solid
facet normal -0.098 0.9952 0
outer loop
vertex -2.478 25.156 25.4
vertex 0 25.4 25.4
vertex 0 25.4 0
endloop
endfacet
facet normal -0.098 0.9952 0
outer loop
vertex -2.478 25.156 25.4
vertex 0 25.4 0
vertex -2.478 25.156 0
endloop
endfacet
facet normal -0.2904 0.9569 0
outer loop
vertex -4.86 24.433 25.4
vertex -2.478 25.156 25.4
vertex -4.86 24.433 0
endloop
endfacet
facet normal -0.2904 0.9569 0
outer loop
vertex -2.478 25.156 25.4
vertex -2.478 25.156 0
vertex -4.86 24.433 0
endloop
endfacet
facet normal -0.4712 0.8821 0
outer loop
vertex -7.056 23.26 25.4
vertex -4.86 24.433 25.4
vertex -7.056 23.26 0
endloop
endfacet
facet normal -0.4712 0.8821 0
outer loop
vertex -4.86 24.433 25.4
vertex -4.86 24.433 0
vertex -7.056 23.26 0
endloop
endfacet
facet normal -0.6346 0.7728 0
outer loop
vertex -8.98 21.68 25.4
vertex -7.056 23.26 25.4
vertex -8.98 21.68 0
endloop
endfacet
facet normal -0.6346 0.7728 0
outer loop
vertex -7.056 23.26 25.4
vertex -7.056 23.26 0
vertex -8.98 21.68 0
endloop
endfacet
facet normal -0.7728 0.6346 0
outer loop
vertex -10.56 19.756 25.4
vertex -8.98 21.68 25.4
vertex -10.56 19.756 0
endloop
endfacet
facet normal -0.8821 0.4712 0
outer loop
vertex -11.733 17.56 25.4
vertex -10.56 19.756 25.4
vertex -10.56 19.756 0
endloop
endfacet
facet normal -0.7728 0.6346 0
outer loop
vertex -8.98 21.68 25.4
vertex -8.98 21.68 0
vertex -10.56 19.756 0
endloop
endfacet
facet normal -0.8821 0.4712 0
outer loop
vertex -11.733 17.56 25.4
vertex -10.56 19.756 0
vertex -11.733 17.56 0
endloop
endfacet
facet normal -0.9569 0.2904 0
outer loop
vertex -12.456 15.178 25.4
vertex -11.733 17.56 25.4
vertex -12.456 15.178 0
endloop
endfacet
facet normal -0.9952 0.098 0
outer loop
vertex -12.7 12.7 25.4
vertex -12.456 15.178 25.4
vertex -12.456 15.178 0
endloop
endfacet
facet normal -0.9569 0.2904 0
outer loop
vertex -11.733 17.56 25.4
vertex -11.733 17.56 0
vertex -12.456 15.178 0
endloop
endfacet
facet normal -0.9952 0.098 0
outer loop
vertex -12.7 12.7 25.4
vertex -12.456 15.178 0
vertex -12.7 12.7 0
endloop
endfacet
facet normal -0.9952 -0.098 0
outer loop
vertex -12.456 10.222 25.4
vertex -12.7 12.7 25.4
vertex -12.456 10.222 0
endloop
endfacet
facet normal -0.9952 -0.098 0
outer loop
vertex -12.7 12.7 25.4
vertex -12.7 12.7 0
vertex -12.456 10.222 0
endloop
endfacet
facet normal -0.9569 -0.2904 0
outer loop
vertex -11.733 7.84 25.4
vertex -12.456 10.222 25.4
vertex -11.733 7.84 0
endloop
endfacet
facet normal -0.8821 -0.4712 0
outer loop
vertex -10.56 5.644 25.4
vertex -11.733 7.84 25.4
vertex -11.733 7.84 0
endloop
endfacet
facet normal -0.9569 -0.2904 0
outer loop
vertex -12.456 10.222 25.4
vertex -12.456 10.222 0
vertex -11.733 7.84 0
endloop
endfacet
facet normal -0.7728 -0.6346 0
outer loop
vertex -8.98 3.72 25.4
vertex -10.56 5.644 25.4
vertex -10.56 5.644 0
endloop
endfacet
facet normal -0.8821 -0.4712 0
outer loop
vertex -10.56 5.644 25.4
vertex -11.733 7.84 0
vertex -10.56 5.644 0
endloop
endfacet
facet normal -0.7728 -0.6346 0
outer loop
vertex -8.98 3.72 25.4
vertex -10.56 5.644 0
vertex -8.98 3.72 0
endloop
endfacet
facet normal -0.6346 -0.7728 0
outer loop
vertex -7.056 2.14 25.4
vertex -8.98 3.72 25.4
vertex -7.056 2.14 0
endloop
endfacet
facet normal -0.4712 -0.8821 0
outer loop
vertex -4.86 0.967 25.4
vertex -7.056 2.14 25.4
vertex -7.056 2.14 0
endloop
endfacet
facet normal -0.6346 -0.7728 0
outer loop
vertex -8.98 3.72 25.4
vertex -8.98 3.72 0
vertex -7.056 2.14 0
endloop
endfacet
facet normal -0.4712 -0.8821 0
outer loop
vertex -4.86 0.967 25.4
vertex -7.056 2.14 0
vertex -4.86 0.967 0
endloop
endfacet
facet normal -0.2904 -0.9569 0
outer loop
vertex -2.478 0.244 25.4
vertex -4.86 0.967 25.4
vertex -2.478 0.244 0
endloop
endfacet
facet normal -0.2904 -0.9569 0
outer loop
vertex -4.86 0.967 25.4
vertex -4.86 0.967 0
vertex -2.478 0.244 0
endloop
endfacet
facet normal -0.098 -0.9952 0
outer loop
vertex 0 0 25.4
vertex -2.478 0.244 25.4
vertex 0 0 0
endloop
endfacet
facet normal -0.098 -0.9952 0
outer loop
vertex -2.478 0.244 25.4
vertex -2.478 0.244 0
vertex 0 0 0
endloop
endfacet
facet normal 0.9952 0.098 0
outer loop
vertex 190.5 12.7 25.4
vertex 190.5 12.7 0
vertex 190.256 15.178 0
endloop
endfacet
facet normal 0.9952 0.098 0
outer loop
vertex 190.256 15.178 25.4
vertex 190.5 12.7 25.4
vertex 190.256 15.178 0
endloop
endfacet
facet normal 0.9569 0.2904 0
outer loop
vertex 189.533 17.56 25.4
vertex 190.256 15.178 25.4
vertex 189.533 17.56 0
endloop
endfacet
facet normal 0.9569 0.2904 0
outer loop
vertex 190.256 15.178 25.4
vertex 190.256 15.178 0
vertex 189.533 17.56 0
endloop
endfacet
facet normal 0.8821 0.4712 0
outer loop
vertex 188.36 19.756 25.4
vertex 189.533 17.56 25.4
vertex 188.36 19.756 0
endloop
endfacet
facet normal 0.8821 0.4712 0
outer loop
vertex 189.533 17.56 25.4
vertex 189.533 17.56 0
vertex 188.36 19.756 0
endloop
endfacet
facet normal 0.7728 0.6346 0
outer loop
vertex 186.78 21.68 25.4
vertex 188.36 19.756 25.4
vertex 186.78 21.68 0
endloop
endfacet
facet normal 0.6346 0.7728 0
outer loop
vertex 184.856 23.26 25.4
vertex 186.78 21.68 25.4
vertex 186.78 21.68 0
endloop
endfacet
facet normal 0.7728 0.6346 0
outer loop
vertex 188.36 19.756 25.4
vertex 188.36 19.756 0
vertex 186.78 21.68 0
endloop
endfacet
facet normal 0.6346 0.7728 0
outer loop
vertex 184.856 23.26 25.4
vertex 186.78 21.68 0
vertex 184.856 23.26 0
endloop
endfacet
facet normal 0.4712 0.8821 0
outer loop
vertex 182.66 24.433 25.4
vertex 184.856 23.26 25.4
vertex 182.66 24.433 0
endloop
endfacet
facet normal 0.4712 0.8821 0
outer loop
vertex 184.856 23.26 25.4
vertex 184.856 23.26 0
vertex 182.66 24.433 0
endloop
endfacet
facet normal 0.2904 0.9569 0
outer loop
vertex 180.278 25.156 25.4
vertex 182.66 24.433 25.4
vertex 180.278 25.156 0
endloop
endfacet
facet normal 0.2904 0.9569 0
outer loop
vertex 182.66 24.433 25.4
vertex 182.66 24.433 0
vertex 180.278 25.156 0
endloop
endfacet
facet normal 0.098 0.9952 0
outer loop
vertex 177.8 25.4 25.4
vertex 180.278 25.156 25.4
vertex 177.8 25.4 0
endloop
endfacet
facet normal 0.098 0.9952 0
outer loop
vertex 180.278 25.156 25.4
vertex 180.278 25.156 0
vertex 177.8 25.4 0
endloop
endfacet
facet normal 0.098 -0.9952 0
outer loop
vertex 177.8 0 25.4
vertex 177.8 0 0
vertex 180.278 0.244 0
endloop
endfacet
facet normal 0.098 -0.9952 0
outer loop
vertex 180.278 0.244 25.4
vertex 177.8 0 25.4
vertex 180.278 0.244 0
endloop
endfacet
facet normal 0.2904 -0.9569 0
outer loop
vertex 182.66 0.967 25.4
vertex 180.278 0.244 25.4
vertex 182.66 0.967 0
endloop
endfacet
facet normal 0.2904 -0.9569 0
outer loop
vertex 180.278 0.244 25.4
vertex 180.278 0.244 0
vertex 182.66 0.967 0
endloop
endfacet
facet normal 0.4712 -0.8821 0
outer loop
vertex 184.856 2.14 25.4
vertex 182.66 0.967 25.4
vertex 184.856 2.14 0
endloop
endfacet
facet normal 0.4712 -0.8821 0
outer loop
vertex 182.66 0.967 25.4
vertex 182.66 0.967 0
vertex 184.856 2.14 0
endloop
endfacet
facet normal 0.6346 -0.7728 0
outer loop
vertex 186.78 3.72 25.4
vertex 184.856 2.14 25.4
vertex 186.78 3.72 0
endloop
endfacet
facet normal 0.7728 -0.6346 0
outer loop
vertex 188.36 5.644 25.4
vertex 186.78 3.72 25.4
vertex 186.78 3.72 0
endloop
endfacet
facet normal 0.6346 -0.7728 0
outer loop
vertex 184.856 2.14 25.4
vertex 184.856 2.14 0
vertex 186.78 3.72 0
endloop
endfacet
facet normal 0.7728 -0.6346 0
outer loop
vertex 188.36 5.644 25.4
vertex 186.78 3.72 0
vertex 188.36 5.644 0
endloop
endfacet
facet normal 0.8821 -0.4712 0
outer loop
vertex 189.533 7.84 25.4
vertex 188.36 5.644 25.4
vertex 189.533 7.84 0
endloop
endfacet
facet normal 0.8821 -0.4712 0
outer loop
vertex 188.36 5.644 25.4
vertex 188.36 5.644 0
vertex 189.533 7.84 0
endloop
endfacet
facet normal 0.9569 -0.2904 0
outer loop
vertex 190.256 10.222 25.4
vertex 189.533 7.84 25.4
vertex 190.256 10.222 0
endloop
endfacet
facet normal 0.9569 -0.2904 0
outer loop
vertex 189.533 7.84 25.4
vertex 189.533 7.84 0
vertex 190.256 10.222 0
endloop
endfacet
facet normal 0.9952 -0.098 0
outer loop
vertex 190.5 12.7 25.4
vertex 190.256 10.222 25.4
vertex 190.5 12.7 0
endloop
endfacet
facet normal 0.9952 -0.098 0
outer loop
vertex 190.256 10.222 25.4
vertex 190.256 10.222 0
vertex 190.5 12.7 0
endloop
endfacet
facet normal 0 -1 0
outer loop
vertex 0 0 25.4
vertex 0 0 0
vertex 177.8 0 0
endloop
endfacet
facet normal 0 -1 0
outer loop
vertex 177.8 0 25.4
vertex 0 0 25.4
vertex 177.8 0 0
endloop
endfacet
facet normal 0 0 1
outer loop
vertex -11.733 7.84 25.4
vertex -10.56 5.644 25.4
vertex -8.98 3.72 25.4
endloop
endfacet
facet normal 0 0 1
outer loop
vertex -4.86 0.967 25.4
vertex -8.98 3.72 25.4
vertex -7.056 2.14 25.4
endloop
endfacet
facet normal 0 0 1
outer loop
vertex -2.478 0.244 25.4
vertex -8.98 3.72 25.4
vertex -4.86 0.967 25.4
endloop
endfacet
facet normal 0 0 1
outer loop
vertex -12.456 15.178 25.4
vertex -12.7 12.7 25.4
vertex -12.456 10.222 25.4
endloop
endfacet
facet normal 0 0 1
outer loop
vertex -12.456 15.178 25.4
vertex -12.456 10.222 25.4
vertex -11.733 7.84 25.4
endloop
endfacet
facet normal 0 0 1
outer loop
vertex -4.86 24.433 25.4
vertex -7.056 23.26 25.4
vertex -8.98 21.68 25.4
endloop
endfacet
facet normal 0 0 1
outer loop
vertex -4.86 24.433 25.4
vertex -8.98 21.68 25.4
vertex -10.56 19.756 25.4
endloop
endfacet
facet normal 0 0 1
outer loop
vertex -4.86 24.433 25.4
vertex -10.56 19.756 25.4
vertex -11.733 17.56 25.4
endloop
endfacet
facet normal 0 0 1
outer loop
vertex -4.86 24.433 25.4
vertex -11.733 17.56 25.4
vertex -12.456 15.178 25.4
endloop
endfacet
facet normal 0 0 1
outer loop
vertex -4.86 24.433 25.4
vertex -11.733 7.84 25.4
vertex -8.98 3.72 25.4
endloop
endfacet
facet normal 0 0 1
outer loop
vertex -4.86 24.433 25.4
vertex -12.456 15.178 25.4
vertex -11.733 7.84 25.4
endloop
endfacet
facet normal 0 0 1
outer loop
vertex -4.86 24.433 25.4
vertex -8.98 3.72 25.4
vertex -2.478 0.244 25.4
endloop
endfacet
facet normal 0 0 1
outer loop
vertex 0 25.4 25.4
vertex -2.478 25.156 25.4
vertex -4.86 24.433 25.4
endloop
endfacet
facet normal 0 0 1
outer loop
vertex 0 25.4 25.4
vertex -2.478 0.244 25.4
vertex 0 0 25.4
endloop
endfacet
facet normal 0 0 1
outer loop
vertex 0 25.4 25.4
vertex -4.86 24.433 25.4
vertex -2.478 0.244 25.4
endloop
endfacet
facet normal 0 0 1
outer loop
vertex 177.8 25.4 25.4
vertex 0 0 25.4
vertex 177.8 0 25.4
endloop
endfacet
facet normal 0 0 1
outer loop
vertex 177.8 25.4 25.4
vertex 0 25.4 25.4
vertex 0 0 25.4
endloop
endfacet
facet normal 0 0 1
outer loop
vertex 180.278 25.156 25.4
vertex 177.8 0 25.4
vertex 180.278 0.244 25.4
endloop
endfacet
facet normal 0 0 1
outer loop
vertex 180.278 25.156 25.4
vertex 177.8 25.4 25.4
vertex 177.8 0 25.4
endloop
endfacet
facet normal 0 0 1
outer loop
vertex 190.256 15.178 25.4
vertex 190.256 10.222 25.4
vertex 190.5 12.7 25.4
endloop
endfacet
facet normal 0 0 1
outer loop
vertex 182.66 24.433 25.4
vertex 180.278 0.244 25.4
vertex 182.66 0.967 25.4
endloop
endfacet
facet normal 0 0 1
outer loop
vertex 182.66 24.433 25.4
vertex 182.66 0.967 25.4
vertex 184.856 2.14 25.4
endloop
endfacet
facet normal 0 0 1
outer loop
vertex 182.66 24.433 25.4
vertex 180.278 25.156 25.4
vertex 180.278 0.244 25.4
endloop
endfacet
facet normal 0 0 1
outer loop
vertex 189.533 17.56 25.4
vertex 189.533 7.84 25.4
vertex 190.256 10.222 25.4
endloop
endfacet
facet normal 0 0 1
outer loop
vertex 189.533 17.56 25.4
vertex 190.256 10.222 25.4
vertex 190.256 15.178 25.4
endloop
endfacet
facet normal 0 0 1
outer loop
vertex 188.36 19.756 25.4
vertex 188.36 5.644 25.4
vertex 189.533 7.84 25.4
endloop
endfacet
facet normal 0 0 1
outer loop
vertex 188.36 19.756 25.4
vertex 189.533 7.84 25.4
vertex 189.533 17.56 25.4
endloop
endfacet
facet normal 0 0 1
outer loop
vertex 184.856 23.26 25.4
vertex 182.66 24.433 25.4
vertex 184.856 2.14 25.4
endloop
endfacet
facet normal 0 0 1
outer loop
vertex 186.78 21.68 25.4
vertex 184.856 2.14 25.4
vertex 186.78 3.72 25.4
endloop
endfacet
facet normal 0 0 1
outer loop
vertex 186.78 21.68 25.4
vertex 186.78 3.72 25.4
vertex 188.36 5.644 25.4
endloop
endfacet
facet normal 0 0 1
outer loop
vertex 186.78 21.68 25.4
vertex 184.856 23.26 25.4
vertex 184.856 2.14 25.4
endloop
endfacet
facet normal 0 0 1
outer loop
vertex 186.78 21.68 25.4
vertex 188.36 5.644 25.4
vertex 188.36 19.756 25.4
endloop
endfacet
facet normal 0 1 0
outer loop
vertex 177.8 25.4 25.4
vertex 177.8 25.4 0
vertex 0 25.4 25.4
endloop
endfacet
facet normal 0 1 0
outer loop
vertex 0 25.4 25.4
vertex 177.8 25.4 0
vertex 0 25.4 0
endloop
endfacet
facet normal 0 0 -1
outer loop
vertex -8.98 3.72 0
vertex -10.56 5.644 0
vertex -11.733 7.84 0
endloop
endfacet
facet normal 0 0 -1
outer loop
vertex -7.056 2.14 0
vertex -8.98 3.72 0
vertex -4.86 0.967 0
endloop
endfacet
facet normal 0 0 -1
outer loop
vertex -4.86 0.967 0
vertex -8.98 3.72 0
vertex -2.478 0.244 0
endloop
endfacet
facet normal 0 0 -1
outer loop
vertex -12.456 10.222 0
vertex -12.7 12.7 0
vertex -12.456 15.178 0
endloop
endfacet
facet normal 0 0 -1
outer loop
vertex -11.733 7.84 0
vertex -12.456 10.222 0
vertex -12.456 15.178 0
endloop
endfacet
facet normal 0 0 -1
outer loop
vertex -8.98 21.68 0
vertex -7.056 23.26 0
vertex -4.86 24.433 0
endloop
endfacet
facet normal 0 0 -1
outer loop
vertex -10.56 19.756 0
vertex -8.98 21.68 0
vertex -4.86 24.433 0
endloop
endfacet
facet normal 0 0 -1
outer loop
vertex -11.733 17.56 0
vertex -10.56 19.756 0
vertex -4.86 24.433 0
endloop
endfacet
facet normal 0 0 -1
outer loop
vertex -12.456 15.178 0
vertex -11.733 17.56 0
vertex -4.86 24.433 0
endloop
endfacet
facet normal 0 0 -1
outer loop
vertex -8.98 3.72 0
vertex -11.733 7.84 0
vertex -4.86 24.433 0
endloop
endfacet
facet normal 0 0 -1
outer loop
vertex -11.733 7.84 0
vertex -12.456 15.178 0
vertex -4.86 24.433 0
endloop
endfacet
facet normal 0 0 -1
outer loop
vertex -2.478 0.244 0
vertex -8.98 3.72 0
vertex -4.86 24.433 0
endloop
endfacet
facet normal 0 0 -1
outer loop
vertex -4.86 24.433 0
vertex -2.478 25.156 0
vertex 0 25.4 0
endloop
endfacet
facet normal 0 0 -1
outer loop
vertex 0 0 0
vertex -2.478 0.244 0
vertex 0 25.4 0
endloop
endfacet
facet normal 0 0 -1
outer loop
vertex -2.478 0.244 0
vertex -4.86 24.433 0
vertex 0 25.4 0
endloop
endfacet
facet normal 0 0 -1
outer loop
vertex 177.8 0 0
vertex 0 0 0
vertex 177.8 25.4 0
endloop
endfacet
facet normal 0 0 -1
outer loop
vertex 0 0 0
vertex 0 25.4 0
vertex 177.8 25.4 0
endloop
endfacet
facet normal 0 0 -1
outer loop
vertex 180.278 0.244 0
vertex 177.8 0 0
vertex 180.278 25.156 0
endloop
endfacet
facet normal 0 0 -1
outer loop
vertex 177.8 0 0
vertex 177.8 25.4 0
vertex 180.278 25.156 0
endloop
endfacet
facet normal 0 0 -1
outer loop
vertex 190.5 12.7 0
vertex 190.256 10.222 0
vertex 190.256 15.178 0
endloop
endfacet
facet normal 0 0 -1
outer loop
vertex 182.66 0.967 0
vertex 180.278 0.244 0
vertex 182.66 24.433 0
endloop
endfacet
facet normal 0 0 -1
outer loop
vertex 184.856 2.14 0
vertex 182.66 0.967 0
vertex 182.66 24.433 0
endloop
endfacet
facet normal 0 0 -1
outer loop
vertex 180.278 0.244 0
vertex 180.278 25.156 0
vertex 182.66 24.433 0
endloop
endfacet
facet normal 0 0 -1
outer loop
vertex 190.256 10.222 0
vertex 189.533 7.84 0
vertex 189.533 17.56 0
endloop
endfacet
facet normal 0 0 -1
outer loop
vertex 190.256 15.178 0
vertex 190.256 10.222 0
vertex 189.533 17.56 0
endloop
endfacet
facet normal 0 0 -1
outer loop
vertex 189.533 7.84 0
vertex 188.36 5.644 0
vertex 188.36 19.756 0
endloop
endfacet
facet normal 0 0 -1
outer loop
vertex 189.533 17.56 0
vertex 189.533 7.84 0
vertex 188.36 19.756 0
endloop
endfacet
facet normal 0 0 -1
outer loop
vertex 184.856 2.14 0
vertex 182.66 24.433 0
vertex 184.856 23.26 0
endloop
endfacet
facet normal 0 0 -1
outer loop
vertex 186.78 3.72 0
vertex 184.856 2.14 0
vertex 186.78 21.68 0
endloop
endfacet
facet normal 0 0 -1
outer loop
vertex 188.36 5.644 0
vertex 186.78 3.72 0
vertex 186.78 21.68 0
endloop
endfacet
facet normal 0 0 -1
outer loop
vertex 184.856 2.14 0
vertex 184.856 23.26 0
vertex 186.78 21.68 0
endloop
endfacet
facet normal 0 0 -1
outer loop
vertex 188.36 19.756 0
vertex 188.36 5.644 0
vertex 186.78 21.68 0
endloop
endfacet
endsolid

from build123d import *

# Parameters (mm, degrees)
BOSS_EXTRUDE1_DEPTH = 25.4


with BuildPart() as part:
    # Sketch1 → Boss-Extrude1 (new body)
    with BuildSketch(Plane.XY):
        with BuildLine():
            ThreePointArc((0, 25.4), (-12.7, 12.7), (0, 0))
            Line((0, 0), (0, 25.4))
        make_face()
        with BuildLine():
            Line((0, 25.4), (0, 0))
            ThreePointArc((0, 0), (8.980256121, 3.719743879), (12.7, 12.7))
            ThreePointArc((12.7, 12.7), (8.980256121, 21.680256121), (0, 25.4))
        make_face()
        with BuildLine():
            ThreePointArc((12.7, 12.7), (8.980256121, 3.719743879), (0, 0))
            Line((0, 0), (177.8, 0))
            ThreePointArc((177.8, 0), (165.1, 12.7), (177.8, 25.4))
            Line((177.8, 25.4), (0, 25.4))
            ThreePointArc((0, 25.4), (8.980256121, 21.680256121), (12.7, 12.7))
        make_face()
        with BuildLine():
            ThreePointArc((177.8, 25.4), (165.1, 12.7), (177.8, 0))
            Line((177.8, 0), (177.8, 25.4))
        make_face()
        with BuildLine():
            Line((177.8, 25.4), (177.8, 0))
            ThreePointArc((177.8, 0), (186.780256121, 3.719743879), (190.5, 12.7))
            ThreePointArc((190.5, 12.7), (186.780256121, 21.680256121), (177.8, 25.4))
        make_face()
    extrude(amount=BOSS_EXTRUDE1_DEPTH)


solid = part.part
